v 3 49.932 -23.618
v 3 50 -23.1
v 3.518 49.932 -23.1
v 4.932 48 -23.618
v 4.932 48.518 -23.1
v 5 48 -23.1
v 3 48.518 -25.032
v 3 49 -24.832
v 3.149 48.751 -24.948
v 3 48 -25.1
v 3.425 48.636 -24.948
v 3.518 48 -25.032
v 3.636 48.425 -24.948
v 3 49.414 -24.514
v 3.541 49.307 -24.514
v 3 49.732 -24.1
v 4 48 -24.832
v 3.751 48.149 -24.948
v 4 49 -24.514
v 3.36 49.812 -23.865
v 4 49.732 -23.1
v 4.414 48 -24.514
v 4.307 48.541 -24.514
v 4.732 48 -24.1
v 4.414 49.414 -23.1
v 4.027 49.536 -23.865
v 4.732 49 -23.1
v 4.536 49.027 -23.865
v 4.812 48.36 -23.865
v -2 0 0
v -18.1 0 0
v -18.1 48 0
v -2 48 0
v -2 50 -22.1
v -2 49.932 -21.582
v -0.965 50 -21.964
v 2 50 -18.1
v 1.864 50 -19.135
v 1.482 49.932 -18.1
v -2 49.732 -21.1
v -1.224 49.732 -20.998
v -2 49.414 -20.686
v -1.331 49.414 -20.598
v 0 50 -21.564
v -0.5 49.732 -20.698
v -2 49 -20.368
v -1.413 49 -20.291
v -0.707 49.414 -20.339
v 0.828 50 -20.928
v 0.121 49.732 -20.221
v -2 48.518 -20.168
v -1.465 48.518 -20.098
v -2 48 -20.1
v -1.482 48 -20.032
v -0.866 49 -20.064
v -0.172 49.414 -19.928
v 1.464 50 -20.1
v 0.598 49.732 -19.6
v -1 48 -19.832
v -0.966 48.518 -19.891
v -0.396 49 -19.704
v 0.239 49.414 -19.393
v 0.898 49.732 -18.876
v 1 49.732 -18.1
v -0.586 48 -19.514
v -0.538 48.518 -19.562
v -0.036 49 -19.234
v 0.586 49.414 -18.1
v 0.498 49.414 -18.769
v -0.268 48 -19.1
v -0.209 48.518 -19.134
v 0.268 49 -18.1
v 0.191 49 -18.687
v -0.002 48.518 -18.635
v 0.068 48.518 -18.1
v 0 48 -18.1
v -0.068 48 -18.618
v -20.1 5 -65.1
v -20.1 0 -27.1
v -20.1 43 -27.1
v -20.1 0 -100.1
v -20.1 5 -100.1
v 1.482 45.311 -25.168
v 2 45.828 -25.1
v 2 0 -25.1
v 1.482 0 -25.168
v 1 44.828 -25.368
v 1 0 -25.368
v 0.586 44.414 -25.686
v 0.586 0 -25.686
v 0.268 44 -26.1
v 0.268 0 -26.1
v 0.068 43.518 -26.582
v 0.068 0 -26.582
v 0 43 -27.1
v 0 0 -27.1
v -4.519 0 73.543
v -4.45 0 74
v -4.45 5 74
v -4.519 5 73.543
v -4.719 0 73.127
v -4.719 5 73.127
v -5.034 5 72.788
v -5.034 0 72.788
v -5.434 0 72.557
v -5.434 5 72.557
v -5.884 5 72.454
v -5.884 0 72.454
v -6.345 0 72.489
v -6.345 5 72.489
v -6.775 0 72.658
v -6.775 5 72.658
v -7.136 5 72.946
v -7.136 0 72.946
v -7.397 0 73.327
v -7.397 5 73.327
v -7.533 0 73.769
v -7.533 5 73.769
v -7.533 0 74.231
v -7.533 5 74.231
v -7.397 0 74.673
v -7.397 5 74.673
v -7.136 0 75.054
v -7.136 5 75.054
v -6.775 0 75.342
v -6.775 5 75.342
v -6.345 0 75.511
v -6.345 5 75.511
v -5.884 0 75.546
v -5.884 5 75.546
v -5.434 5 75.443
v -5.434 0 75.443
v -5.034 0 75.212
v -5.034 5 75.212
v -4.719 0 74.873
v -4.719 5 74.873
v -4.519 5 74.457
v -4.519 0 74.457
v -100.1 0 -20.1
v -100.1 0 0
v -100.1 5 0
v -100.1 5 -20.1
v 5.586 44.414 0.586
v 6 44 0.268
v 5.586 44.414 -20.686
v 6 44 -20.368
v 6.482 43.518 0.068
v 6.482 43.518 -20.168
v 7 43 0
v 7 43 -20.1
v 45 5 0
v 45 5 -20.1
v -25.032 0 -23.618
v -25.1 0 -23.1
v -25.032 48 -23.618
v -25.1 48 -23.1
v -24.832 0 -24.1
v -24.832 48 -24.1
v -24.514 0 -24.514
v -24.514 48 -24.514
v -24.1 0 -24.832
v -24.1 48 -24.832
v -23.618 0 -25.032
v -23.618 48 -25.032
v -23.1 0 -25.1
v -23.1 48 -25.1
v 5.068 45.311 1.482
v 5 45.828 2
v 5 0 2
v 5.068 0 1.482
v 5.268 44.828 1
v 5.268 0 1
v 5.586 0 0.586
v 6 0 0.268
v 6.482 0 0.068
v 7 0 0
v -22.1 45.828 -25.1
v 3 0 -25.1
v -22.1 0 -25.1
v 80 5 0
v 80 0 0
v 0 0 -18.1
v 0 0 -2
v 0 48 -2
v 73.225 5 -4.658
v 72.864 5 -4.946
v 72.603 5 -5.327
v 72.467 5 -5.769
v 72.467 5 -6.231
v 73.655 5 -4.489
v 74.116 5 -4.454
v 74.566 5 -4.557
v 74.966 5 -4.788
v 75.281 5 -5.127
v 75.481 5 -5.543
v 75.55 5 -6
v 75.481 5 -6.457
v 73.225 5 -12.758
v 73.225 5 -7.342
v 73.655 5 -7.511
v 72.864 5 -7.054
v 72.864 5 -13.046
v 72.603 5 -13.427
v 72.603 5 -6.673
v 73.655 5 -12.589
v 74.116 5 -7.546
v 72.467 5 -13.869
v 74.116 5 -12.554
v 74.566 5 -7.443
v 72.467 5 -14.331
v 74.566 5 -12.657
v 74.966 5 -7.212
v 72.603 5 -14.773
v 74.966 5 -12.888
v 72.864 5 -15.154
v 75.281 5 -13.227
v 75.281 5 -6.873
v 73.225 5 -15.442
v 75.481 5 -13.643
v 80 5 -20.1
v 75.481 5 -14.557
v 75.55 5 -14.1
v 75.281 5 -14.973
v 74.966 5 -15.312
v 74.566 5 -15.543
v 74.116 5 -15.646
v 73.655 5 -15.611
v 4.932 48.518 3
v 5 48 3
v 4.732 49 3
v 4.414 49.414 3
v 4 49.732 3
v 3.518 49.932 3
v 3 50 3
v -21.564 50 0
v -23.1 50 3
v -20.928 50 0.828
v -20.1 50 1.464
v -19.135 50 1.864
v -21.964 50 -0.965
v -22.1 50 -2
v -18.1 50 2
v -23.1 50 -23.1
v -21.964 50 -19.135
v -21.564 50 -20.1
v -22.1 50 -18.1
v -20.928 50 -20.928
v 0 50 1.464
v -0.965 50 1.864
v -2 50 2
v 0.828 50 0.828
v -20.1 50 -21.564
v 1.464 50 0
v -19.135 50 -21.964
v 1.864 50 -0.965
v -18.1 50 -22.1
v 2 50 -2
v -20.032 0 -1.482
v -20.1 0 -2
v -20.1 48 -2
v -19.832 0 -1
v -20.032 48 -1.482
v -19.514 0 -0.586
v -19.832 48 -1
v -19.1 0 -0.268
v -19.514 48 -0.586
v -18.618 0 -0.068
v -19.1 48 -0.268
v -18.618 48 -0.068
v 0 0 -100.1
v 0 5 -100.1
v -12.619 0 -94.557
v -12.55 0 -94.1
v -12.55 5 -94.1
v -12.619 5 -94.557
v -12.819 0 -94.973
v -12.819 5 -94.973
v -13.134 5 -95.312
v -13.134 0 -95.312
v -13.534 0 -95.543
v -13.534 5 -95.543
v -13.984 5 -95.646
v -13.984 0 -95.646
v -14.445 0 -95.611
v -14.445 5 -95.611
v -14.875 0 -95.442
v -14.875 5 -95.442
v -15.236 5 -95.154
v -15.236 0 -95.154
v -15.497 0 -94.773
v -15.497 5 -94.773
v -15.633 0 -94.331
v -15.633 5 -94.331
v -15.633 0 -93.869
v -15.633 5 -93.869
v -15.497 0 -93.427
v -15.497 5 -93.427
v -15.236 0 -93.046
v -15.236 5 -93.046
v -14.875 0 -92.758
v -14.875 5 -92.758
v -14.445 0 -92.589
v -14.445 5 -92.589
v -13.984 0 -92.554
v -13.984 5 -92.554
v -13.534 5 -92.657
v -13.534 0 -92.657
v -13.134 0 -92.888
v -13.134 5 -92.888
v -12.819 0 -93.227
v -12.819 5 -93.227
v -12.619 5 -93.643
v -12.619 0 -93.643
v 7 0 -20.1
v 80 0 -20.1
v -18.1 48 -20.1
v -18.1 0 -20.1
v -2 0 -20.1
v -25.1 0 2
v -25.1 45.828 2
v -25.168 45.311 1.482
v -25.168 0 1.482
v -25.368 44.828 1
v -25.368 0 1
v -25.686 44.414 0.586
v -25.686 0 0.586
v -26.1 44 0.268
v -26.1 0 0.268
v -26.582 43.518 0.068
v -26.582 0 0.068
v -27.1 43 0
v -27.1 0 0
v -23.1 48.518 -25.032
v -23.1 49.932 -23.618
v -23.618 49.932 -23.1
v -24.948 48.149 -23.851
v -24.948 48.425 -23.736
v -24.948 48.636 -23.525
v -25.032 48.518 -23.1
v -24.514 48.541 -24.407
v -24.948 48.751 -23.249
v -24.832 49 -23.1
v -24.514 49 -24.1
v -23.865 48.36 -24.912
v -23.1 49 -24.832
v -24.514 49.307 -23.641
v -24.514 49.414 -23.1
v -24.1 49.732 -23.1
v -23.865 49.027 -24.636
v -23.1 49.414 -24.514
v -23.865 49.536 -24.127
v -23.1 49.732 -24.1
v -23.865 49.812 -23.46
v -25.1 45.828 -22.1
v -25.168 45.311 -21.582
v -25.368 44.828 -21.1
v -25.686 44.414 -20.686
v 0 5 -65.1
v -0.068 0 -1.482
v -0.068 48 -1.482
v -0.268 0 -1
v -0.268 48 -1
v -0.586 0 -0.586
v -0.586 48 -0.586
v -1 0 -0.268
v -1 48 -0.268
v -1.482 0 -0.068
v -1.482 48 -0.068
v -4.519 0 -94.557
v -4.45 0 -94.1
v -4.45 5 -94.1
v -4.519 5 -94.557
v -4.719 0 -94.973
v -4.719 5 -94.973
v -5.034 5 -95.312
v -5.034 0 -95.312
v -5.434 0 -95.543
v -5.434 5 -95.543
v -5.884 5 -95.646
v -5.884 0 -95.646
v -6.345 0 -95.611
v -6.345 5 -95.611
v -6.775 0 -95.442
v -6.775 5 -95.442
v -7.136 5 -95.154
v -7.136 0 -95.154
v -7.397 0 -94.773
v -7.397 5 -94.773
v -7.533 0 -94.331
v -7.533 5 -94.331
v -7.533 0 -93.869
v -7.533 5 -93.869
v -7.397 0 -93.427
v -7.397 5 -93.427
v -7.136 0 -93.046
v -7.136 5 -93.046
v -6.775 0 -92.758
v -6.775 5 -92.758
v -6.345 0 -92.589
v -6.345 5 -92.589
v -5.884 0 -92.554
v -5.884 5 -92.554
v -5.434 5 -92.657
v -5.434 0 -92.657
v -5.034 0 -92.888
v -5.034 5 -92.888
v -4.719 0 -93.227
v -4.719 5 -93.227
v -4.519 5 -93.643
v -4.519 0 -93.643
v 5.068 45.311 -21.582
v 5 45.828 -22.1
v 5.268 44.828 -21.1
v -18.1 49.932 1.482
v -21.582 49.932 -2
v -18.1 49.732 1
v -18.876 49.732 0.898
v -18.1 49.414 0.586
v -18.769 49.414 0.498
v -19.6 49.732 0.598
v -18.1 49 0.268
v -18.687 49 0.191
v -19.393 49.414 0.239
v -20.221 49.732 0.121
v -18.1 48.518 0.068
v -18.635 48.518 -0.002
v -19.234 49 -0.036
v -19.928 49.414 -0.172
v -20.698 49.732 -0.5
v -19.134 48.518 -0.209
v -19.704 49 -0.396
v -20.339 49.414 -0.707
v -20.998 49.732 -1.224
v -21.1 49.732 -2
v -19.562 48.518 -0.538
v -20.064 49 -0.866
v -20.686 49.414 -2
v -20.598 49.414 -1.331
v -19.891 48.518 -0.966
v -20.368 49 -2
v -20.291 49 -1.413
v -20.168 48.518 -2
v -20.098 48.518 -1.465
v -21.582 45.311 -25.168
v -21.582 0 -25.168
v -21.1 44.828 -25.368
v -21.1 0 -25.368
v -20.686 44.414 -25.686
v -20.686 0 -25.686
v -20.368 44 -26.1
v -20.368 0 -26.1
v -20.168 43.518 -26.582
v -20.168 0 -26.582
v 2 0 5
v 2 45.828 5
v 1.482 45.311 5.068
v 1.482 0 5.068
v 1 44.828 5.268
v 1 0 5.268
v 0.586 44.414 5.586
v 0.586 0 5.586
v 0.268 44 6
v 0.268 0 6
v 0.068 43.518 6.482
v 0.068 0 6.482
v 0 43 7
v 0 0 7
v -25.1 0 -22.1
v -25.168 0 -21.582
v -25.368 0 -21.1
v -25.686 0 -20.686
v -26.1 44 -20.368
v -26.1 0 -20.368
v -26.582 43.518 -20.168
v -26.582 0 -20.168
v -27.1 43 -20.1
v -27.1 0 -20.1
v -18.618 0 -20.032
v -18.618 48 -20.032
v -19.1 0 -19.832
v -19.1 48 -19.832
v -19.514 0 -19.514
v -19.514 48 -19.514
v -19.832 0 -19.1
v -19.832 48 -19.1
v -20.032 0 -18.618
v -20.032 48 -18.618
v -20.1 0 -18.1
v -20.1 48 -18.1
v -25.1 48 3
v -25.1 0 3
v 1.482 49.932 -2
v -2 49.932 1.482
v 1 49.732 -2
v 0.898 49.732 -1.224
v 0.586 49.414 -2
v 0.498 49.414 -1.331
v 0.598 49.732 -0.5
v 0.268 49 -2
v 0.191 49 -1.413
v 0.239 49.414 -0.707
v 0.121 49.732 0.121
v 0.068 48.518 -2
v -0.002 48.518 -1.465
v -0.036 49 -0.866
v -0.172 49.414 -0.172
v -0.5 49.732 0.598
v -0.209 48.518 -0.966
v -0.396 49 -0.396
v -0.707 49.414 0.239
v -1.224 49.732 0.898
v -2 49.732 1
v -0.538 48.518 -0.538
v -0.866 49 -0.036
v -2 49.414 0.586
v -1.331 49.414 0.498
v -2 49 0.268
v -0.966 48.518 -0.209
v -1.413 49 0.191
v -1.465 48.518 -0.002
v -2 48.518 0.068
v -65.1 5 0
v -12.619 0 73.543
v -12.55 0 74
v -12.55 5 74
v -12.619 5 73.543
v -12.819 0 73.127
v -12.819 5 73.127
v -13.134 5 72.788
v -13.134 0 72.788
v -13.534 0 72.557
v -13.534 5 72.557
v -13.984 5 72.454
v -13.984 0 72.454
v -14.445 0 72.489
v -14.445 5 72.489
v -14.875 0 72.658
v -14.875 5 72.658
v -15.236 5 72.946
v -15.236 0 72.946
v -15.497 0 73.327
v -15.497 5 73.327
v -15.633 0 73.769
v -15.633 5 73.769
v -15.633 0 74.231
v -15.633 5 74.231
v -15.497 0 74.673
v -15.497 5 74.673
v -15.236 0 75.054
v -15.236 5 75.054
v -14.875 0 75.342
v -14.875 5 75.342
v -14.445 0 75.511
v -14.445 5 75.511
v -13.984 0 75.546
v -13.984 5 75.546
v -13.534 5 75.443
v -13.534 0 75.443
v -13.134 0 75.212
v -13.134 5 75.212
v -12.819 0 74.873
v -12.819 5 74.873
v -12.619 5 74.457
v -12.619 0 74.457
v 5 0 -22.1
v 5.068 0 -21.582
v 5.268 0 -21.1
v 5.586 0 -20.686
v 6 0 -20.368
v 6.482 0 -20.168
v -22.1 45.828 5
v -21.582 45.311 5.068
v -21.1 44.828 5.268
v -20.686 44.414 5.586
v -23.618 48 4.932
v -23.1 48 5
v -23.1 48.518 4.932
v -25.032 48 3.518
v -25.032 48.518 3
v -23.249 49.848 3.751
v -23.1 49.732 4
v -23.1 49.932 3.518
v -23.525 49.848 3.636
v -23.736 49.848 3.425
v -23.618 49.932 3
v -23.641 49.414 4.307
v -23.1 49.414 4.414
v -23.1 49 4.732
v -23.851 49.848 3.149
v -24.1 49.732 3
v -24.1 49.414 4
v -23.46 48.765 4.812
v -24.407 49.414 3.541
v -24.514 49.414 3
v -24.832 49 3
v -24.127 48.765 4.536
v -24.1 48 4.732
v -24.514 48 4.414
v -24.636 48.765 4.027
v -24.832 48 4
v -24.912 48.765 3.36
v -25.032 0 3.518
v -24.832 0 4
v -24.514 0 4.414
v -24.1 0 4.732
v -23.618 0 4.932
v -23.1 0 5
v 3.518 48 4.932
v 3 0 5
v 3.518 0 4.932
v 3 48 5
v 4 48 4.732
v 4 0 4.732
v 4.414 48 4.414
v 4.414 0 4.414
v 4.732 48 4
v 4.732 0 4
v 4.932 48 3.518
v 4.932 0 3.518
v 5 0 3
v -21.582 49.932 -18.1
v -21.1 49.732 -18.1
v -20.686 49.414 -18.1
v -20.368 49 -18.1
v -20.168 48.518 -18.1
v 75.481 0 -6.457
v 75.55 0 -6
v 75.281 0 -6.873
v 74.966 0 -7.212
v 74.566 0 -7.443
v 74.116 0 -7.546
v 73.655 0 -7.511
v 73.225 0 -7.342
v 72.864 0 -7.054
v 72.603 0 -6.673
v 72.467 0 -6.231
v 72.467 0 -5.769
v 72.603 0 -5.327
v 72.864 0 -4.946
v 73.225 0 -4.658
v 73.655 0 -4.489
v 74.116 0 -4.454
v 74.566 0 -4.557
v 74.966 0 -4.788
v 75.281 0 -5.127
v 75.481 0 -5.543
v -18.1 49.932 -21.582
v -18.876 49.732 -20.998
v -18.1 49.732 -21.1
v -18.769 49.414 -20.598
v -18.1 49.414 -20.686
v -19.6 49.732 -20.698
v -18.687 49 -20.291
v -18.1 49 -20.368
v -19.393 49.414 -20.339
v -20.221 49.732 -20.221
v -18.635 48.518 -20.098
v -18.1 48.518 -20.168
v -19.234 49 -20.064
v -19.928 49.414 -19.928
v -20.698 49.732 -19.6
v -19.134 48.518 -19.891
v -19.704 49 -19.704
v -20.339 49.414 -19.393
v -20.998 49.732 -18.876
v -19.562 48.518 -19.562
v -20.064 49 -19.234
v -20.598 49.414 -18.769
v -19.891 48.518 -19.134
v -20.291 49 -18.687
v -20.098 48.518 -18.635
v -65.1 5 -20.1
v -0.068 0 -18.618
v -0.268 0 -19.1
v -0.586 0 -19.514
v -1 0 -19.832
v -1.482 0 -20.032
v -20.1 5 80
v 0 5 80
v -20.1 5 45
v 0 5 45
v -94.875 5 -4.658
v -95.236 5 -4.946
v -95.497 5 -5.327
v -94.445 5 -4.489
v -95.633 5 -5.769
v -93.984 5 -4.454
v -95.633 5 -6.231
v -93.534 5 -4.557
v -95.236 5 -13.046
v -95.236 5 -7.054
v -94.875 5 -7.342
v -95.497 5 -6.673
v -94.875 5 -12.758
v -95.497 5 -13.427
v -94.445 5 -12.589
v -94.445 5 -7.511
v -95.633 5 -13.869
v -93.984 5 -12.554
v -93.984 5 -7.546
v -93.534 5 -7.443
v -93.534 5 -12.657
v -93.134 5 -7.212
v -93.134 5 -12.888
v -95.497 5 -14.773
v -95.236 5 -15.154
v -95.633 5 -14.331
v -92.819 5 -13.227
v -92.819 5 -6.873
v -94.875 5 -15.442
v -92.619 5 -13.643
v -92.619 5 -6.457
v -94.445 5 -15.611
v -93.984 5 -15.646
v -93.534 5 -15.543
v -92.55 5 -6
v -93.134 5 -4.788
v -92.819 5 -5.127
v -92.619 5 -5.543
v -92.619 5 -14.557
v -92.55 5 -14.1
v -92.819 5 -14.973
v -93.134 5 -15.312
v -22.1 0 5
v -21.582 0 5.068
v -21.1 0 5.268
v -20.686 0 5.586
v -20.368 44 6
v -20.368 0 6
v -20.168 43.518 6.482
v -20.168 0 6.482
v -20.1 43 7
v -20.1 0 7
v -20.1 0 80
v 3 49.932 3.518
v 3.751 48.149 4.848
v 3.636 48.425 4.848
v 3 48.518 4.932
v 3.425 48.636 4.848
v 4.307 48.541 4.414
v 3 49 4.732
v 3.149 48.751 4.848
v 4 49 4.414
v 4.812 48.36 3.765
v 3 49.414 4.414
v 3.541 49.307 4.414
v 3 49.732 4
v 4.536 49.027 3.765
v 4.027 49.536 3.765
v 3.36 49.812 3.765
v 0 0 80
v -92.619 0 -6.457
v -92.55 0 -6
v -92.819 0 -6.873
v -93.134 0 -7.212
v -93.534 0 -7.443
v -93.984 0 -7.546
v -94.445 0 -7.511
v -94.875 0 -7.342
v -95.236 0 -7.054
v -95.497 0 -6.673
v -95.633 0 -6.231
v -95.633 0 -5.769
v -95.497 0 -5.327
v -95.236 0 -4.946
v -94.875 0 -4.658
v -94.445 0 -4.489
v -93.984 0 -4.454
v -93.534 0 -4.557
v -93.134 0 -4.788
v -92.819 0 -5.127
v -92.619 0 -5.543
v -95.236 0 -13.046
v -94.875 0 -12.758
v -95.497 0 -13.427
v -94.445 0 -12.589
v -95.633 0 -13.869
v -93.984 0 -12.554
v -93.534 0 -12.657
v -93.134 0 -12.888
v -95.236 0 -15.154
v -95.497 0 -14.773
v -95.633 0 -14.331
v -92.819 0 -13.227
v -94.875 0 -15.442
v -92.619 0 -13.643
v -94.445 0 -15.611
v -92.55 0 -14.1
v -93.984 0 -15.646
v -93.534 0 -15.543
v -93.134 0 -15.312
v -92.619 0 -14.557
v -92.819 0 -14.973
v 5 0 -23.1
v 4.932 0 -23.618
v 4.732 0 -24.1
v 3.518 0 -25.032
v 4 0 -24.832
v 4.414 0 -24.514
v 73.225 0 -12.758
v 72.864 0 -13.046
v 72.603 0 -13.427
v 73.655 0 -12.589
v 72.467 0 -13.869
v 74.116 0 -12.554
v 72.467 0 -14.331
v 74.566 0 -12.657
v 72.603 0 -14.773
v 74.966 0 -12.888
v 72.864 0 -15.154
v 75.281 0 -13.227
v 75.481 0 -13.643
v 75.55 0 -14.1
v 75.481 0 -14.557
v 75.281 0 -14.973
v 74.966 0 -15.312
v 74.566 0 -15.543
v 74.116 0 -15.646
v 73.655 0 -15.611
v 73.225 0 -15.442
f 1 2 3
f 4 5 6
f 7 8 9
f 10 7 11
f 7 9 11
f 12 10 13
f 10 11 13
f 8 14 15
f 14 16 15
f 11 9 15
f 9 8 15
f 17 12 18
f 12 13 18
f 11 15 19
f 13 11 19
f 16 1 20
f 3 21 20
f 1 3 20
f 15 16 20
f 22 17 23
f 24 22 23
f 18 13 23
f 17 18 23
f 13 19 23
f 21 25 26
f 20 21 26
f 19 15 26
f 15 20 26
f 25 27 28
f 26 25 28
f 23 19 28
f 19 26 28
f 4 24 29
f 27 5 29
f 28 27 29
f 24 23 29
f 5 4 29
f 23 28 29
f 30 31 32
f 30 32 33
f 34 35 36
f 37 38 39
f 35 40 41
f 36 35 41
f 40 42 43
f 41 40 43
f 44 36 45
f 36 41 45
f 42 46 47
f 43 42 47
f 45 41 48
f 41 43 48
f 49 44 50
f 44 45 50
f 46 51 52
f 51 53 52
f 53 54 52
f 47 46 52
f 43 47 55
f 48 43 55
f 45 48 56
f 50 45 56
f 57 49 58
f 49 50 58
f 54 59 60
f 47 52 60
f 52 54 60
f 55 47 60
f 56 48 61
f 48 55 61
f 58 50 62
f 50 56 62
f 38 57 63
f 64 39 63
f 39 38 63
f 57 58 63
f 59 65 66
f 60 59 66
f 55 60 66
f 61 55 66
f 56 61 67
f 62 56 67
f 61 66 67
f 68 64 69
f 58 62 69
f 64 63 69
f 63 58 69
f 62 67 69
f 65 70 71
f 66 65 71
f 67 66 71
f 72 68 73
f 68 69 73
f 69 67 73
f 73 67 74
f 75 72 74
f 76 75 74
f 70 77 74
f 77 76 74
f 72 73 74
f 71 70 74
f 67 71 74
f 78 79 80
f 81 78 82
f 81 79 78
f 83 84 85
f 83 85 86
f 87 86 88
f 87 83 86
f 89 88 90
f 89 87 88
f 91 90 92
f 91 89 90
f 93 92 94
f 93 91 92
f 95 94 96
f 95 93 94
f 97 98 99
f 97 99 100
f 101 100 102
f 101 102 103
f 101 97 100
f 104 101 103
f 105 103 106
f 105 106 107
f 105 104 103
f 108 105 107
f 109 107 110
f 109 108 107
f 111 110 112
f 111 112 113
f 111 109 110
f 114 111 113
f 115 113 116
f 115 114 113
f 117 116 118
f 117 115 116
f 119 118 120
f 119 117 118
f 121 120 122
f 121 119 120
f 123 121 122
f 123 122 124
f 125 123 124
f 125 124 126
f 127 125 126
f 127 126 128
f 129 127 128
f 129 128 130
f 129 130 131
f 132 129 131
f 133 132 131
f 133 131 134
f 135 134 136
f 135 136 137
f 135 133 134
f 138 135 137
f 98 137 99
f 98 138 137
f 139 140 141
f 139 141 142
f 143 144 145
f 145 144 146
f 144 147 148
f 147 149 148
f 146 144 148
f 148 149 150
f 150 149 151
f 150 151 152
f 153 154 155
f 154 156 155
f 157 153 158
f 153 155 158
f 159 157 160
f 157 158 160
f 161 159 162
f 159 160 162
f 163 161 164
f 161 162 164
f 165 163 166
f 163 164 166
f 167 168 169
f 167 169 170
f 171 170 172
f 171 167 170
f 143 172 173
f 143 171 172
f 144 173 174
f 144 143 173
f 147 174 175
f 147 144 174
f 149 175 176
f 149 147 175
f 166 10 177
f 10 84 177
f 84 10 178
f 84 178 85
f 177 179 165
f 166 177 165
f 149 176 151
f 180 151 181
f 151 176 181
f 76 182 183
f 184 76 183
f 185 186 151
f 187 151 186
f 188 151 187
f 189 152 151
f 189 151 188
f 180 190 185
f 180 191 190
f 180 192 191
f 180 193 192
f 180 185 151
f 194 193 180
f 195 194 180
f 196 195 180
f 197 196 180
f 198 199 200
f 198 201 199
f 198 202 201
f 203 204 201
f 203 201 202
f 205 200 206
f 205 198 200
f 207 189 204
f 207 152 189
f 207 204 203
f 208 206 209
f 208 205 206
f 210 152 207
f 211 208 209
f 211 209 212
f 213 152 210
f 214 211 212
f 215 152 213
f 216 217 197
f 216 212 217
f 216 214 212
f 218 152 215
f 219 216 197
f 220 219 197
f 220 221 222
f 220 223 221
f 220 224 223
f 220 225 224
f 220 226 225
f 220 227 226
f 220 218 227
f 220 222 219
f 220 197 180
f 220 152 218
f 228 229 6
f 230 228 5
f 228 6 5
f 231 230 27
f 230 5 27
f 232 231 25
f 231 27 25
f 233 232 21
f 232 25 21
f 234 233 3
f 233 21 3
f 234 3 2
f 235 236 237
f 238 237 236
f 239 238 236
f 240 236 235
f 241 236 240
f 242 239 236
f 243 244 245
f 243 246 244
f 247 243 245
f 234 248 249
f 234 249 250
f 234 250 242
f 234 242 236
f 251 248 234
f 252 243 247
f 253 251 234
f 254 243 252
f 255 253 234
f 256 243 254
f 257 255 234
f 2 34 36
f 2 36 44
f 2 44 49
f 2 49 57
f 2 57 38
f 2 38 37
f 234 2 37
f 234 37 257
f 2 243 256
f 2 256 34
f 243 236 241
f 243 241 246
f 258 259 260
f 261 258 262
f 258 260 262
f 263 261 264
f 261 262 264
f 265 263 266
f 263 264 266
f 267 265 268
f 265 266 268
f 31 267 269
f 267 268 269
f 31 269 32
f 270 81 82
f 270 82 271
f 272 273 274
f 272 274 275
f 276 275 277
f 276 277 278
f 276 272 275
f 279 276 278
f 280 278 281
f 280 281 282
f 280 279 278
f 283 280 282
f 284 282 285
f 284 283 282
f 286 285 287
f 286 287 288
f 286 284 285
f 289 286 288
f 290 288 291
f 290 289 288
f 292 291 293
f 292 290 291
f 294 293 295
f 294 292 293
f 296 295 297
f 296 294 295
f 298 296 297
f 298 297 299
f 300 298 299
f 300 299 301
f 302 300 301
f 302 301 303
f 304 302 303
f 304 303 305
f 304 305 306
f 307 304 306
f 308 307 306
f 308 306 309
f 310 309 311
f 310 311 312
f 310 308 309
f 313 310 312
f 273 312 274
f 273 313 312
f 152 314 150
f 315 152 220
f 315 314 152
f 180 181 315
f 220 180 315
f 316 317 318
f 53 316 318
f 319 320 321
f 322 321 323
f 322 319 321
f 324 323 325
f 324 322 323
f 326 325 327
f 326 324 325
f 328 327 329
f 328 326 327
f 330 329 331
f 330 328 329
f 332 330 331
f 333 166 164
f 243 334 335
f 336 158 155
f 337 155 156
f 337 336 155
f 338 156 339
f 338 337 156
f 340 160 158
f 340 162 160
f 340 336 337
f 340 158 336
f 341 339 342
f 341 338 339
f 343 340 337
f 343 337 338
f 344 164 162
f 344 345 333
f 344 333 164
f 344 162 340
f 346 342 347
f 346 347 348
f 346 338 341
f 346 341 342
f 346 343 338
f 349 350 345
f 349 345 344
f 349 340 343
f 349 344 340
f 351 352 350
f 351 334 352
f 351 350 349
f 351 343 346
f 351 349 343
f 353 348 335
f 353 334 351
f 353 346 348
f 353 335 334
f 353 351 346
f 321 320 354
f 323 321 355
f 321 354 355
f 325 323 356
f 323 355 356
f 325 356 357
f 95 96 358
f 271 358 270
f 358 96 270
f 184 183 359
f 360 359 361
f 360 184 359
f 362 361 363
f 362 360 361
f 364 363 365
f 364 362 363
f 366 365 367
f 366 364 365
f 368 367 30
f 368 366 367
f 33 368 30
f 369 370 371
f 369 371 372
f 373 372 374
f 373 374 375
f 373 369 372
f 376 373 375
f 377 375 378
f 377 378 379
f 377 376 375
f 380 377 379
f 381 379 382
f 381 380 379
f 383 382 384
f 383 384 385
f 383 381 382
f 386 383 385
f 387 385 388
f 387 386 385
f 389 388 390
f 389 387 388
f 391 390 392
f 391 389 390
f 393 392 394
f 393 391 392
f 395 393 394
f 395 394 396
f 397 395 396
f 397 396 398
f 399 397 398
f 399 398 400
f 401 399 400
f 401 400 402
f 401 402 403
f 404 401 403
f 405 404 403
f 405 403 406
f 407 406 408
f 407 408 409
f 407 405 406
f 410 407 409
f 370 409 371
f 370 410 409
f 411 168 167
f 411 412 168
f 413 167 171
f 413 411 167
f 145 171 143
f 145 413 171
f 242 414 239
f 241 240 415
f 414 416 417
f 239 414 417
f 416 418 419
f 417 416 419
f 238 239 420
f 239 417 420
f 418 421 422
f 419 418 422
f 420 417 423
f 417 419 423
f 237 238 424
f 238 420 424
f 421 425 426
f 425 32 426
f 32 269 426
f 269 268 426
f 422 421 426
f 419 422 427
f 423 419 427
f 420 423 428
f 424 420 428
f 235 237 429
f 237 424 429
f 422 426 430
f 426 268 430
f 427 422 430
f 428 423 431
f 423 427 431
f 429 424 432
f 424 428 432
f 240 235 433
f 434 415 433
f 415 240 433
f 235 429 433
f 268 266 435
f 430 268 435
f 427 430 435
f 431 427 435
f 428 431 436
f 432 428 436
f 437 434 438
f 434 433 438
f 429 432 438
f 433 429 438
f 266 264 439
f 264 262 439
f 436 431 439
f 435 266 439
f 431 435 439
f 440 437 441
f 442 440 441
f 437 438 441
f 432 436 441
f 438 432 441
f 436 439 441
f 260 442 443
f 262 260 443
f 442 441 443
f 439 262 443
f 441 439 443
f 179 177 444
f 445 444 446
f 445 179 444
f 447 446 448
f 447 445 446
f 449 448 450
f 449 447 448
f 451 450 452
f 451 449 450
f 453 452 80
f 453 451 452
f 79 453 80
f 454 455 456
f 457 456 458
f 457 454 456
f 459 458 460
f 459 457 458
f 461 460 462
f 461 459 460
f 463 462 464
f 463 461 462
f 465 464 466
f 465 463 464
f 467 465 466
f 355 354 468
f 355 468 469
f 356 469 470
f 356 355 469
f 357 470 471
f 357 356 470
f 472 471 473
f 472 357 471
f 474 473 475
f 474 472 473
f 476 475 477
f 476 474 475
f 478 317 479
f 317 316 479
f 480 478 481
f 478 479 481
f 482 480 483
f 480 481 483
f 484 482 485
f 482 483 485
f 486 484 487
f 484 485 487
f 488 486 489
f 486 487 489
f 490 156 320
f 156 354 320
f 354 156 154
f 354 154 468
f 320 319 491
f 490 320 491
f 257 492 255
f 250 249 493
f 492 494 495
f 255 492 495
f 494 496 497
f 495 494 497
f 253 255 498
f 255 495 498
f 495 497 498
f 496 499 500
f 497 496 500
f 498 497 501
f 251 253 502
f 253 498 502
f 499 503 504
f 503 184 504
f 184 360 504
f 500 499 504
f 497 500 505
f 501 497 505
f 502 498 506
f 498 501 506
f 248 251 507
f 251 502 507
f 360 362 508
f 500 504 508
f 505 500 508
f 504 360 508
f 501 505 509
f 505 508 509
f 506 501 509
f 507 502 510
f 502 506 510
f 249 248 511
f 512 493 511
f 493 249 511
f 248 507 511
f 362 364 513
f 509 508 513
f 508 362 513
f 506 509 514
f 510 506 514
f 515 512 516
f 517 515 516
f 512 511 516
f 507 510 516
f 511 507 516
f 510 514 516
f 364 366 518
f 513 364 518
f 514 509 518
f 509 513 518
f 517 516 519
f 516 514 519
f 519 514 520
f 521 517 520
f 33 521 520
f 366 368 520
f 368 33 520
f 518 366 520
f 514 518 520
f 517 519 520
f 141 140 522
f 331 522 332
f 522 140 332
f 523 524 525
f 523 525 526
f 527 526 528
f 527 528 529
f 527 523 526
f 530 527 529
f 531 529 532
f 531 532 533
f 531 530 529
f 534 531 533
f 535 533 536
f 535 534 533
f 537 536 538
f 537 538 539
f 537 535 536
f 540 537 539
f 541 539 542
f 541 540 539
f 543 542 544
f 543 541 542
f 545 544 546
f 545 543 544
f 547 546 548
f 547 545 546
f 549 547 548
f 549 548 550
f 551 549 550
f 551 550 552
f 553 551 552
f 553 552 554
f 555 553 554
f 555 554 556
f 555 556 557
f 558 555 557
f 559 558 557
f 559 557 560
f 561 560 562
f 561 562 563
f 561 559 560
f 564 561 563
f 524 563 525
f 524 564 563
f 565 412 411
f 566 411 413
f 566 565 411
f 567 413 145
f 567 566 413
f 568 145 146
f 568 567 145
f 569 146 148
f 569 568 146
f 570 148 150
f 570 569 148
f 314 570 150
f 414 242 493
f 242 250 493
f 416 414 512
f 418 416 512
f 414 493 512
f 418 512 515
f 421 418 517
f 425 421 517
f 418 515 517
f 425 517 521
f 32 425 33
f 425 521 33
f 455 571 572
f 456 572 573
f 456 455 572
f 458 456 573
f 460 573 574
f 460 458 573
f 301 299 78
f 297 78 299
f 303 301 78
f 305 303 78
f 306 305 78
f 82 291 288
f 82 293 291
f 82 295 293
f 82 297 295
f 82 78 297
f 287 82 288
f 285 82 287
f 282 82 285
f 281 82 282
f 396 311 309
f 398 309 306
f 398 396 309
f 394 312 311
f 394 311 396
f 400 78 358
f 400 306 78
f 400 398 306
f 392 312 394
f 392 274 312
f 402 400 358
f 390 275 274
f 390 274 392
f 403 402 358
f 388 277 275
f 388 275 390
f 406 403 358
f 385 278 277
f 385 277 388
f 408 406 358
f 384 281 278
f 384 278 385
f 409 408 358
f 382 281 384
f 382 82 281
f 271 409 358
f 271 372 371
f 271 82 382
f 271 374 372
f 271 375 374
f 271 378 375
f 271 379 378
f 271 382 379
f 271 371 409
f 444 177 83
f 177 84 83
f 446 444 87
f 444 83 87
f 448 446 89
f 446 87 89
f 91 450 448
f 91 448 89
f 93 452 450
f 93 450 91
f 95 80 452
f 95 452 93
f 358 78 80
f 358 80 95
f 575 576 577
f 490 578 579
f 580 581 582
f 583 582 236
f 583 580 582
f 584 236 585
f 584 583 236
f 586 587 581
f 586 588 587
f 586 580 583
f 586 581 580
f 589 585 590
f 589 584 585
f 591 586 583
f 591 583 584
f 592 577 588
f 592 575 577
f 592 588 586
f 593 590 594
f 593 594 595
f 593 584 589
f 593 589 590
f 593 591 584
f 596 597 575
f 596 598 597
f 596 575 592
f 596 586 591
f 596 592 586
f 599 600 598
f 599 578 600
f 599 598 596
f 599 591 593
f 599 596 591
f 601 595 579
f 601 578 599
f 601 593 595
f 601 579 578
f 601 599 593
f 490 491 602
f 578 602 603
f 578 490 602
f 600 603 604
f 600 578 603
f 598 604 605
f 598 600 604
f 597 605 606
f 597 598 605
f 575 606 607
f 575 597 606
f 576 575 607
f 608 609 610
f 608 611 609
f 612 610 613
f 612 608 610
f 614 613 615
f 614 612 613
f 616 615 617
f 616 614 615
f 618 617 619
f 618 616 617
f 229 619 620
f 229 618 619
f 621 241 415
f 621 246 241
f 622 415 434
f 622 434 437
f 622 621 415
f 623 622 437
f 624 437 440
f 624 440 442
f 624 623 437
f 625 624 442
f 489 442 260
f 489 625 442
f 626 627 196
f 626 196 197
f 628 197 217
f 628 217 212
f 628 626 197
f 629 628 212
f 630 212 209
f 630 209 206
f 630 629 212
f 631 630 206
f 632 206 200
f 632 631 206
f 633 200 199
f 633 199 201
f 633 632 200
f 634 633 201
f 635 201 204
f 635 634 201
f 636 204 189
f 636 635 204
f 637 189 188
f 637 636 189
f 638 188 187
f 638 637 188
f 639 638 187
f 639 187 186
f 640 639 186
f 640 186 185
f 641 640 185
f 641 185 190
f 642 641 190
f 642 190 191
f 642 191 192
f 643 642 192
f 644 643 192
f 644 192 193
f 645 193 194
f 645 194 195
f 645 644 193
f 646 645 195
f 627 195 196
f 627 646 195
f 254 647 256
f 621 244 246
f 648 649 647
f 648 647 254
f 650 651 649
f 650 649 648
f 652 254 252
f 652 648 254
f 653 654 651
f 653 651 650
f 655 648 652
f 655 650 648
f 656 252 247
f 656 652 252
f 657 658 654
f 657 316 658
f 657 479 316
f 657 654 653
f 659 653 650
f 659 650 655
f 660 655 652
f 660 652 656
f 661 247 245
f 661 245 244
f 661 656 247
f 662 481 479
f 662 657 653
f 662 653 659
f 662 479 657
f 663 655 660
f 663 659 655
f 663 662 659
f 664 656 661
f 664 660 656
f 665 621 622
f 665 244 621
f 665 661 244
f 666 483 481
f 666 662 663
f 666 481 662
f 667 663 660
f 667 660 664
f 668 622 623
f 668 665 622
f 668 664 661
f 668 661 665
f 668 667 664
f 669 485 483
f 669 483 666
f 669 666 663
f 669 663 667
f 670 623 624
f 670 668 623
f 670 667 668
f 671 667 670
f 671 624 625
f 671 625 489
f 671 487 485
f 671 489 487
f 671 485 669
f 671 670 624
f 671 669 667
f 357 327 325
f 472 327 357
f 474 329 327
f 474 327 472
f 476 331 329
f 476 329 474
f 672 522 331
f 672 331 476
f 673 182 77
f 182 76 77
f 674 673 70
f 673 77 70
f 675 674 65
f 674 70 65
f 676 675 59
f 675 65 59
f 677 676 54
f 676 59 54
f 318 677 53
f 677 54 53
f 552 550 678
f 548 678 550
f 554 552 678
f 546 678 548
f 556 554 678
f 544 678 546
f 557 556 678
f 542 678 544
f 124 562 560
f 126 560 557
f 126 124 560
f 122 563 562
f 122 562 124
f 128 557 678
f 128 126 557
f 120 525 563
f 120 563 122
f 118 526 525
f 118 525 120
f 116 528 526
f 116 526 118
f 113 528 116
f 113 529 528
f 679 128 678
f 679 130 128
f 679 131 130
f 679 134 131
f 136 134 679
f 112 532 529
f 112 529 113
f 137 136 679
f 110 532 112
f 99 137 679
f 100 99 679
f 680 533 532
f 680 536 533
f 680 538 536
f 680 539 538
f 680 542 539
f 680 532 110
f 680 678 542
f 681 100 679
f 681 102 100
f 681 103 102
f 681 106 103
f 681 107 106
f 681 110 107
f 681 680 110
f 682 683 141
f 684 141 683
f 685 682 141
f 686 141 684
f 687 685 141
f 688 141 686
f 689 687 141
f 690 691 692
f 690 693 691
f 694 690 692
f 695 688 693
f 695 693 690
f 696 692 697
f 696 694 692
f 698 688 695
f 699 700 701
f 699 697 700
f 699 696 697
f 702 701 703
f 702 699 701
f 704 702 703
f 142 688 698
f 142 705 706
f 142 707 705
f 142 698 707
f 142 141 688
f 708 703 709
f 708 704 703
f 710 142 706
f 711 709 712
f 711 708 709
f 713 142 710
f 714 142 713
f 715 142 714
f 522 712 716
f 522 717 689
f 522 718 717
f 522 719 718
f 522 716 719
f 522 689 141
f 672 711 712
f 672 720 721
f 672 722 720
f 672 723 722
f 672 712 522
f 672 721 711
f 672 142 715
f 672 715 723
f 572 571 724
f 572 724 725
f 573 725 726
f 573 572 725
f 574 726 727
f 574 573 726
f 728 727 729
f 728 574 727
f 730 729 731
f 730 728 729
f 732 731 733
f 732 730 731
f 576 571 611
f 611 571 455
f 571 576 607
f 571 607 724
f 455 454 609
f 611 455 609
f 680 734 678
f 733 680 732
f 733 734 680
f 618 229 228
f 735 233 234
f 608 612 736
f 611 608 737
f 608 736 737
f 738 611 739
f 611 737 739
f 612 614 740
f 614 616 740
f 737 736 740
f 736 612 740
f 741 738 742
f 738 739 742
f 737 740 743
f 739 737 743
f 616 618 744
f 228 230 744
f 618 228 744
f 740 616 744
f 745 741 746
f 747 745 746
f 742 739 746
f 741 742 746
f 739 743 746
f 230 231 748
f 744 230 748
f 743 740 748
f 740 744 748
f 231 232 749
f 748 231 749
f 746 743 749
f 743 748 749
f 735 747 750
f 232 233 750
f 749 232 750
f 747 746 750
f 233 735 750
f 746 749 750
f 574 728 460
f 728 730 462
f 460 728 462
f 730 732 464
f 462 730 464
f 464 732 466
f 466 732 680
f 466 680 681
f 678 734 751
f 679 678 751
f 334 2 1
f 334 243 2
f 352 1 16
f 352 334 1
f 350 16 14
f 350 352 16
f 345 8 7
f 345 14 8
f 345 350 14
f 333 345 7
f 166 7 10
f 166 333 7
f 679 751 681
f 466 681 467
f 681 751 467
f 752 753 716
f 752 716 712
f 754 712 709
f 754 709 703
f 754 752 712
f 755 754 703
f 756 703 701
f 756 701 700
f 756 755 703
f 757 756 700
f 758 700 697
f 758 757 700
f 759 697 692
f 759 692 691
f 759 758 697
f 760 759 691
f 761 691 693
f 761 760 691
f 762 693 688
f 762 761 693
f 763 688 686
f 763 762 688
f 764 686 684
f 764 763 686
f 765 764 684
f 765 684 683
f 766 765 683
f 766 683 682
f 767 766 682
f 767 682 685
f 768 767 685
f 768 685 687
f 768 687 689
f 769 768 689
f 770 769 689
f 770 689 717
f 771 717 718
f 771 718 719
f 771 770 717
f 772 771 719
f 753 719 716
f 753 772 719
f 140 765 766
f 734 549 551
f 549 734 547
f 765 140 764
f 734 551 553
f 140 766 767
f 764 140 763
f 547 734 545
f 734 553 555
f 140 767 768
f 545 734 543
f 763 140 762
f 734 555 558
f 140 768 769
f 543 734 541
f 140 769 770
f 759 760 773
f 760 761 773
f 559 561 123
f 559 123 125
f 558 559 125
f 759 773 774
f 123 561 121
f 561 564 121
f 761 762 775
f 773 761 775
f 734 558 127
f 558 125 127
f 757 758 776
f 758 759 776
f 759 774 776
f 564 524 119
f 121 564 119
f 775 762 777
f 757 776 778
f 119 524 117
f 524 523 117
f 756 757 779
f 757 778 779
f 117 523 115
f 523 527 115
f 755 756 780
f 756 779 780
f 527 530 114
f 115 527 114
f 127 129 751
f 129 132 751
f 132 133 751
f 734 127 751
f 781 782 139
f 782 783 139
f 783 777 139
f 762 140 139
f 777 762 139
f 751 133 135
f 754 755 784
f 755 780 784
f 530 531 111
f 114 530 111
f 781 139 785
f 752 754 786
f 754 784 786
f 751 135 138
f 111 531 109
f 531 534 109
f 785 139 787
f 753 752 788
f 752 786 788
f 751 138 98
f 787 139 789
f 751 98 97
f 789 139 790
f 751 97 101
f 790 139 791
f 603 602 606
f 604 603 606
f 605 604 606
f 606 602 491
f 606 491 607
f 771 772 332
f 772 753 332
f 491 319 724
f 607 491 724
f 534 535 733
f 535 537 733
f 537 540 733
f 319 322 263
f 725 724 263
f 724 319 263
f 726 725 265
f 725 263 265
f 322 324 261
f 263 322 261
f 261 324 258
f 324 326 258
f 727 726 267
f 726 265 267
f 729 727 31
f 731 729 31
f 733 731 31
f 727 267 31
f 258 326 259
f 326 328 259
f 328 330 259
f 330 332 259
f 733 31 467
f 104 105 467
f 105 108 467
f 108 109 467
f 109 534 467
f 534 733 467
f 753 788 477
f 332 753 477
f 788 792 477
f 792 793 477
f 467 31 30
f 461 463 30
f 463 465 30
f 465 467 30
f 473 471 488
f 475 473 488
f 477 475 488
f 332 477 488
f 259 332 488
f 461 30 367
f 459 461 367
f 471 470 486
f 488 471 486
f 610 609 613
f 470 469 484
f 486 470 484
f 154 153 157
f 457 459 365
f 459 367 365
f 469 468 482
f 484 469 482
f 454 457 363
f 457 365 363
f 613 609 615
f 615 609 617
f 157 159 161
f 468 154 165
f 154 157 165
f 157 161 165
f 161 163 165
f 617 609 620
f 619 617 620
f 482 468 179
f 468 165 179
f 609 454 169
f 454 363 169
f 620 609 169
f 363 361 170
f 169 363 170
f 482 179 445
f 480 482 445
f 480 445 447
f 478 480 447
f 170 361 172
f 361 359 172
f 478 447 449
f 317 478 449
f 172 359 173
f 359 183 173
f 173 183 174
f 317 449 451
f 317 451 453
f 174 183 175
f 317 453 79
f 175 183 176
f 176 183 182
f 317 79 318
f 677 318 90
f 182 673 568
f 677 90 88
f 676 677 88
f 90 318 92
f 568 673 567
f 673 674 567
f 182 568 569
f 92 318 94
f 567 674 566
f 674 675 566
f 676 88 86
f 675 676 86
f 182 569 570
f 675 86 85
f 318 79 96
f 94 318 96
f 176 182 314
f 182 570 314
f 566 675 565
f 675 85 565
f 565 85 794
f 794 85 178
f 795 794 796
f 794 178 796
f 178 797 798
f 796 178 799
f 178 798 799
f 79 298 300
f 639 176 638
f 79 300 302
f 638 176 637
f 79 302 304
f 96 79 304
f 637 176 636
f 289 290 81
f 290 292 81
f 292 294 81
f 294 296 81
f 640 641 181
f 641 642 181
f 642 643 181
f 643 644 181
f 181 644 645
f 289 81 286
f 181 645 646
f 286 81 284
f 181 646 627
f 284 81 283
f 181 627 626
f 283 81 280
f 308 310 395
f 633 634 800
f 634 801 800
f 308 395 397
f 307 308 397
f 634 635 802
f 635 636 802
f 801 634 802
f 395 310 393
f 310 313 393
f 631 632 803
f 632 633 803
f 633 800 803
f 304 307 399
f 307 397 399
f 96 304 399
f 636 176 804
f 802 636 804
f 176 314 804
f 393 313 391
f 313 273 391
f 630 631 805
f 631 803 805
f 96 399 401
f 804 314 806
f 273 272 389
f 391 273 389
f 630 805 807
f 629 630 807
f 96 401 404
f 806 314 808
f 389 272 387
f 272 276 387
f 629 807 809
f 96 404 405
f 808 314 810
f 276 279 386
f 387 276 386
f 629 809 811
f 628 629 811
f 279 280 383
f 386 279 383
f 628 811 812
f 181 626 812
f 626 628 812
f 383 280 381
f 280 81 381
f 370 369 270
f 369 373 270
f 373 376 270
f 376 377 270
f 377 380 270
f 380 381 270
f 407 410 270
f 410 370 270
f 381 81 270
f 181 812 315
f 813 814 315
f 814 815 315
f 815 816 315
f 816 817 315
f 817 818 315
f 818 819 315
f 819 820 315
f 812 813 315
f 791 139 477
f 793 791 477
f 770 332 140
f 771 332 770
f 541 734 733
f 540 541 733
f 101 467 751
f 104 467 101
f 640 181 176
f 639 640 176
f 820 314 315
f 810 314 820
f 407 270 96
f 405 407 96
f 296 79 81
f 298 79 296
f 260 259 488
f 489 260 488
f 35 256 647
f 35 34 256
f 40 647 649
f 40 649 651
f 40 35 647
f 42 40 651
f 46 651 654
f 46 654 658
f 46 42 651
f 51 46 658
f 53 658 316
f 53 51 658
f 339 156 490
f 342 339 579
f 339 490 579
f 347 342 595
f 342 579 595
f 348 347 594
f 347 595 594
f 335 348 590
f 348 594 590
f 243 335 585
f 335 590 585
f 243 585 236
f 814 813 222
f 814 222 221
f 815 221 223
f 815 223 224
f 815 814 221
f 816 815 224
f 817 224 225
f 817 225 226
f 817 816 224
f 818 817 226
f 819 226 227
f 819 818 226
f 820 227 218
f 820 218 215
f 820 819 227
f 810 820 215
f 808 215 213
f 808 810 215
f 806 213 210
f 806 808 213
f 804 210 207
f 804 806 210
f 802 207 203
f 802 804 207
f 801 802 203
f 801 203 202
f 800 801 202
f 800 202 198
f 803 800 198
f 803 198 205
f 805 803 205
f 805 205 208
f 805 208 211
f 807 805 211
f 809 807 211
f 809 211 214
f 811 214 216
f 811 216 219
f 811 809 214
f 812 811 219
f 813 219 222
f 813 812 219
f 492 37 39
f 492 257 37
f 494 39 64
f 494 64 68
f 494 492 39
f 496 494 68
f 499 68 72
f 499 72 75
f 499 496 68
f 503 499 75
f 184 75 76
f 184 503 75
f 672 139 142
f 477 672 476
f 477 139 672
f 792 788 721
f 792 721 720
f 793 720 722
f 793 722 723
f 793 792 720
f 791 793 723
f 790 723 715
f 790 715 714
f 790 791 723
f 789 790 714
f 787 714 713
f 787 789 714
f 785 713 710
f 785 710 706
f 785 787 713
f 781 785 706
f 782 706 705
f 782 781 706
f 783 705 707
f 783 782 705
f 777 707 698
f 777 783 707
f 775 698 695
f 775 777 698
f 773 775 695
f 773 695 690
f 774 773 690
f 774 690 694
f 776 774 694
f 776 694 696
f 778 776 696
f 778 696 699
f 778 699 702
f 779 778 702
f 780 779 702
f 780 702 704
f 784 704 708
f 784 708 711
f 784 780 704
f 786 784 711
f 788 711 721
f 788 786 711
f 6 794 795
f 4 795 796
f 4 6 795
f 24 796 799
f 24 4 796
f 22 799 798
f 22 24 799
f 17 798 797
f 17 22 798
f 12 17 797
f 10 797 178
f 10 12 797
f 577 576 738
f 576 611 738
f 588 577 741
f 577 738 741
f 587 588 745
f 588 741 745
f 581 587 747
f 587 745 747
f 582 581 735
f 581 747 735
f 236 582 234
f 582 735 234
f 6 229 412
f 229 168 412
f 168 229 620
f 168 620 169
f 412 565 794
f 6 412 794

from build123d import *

# Parameters (mm, degrees)
SKETCH1_W             = 75
SKETCH1_H             = 20.1
SKETCH1_R             = 1.55
BOSS_EXTRUDE1_DEPTH   = 5
SKETCH1_W_2           = 20.1
SKETCH1_H_2           = 75
BOSS_EXTRUDE1_2_DEPTH = 5
BOSS_EXTRUDE1_3_DEPTH = 5
BOSS_EXTRUDE1_4_DEPTH = 5
SKETCH1_8_W           = 30.1
SKETCH1_8_H           = 30.1
SKETCH1_8_W_2         = 20.1
SKETCH1_8_H_2         = 20.1
BOSS_EXTRUDE2_DEPTH   = 50
CHAMFER1_SIZE         = 40
FILLET1_R             = 2


with BuildPart() as part:
    # Sketch1 → Boss-Extrude1 (new body)
    with BuildSketch(Plane(origin=(0, 0, 0), x_dir=(1, 0, 0), z_dir=(0, 1, 0))):
        with Locations((42.5, 10.05)):
            Rectangle(SKETCH1_W, SKETCH1_H)
        with Locations((74, 6)):
            Circle(SKETCH1_R, mode=Mode.SUBTRACT)
        with Locations((74, 14.1)):
            Circle(SKETCH1_R, mode=Mode.SUBTRACT)
    extrude(amount=BOSS_EXTRUDE1_DEPTH)



with BuildPart() as body_2:
    # Sketch1 → Boss-Extrude1 2 (new body)
    with BuildSketch(Plane(origin=(0, 0, 0), x_dir=(1, 0, 0), z_dir=(0, 1, 0))):
        with Locations((-10.05, -42.5)):
            Rectangle(SKETCH1_W_2, SKETCH1_H_2)
        with Locations((-14.1, -74)):
            Circle(SKETCH1_R, mode=Mode.SUBTRACT)
        with Locations((-6, -74)):
            Circle(SKETCH1_R, mode=Mode.SUBTRACT)
    extrude(amount=BOSS_EXTRUDE1_2_DEPTH)


with BuildPart() as body_3:
    # Sketch1 → Boss-Extrude1 3 (new body)
    with BuildSketch(Plane(origin=(0, 0, 0), x_dir=(1, 0, 0), z_dir=(0, 1, 0))):
        with Locations((-10.05, 62.6)):
            Rectangle(SKETCH1_W_2, SKETCH1_H_2)
        with Locations((-14.1, 94.1)):
            Circle(SKETCH1_R, mode=Mode.SUBTRACT)
        with Locations((-6, 94.1)):
            Circle(SKETCH1_R, mode=Mode.SUBTRACT)
    extrude(amount=BOSS_EXTRUDE1_3_DEPTH)


with BuildPart() as body_4:
    # Sketch1 → Boss-Extrude1 4 (new body)
    with BuildSketch(Plane(origin=(0, 0, 0), x_dir=(1, 0, 0), z_dir=(0, 1, 0))):
        with Locations((-62.6, 10.05)):
            Rectangle(SKETCH1_W, SKETCH1_H)
        with Locations((-94.1, 6)):
            Circle(SKETCH1_R, mode=Mode.SUBTRACT)
        with Locations((-94.1, 14.1)):
            Circle(SKETCH1_R, mode=Mode.SUBTRACT)
    extrude(amount=BOSS_EXTRUDE1_4_DEPTH)


with BuildPart() as part_1:
    add(part.part)

    add(body_2.part)  # Boss-Extrude2 merges body 2

    add(body_3.part)  # Boss-Extrude2 merges body 3

    add(body_4.part)  # Boss-Extrude2 merges body 4
    # Sketch1<8> → Boss-Extrude2 (add)
    with BuildSketch(Plane(origin=(0, 0, 0), x_dir=(1, 0, 0), z_dir=(0, 1, 0))):
        with Locations((-10.05, 10.05)):
            Rectangle(SKETCH1_8_W, SKETCH1_8_H)
        with Locations((-10.05, 10.05)):
            Rectangle(SKETCH1_8_W_2, SKETCH1_8_H_2, mode=Mode.SUBTRACT)
    extrude(amount=BOSS_EXTRUDE2_DEPTH)

    # Chamfer1
    chamfer1_edges = [part_1.edges().sort_by_distance(p)[0] for p in [
        (-10.05, 5, -25.1),
        (5, 5, -10.05),
        (-10.05, 5, 5),
        (-25.1, 5, -10.05),
    ]]
    chamfer(chamfer1_edges, length=CHAMFER1_SIZE)

    # Fillet1
    fillet1_edges = [part_1.edges().sort_by_distance(p)[0] for p in [
        (-10.05, 50, -20.1),
        (-20.1, 50, -10.05),
        (-10.05, 50, 0),
        (0, 50, -10.05),
        (-25.1, 50, -10.05),
        (-10.05, 50, -25.1),
        (5, 50, -10.05),
        (-10.05, 50, 5),
        (-10.05, 45, 5),
        (5, 45, -10.05),
        (-10.05, 45, -25.1),
        (-25.1, 45, -10.05),
        (-25.1, 22.5, -20.1),
        (-25.1, 25, -25.1),
        (-20.1, 22.5, -25.1),
        (0, 22.5, -25.1),
        (5, 25, -25.1),
        (5, 22.5, -20.1),
        (0, 25, -20.1),
        (0, 22.5, 5),
        (5, 22.5, 0),
        (5, 25, 5),
        (-20.1, 22.5, 5),
        (-25.1, 22.5, 0),
        (-25.1, 25, 5),
        (0, 25, 0),
        (-20.1, 25, 0),
        (-20.1, 25, -20.1),
    ]]
    fillet(fillet1_edges, radius=FILLET1_R)


solid = part_1.part
